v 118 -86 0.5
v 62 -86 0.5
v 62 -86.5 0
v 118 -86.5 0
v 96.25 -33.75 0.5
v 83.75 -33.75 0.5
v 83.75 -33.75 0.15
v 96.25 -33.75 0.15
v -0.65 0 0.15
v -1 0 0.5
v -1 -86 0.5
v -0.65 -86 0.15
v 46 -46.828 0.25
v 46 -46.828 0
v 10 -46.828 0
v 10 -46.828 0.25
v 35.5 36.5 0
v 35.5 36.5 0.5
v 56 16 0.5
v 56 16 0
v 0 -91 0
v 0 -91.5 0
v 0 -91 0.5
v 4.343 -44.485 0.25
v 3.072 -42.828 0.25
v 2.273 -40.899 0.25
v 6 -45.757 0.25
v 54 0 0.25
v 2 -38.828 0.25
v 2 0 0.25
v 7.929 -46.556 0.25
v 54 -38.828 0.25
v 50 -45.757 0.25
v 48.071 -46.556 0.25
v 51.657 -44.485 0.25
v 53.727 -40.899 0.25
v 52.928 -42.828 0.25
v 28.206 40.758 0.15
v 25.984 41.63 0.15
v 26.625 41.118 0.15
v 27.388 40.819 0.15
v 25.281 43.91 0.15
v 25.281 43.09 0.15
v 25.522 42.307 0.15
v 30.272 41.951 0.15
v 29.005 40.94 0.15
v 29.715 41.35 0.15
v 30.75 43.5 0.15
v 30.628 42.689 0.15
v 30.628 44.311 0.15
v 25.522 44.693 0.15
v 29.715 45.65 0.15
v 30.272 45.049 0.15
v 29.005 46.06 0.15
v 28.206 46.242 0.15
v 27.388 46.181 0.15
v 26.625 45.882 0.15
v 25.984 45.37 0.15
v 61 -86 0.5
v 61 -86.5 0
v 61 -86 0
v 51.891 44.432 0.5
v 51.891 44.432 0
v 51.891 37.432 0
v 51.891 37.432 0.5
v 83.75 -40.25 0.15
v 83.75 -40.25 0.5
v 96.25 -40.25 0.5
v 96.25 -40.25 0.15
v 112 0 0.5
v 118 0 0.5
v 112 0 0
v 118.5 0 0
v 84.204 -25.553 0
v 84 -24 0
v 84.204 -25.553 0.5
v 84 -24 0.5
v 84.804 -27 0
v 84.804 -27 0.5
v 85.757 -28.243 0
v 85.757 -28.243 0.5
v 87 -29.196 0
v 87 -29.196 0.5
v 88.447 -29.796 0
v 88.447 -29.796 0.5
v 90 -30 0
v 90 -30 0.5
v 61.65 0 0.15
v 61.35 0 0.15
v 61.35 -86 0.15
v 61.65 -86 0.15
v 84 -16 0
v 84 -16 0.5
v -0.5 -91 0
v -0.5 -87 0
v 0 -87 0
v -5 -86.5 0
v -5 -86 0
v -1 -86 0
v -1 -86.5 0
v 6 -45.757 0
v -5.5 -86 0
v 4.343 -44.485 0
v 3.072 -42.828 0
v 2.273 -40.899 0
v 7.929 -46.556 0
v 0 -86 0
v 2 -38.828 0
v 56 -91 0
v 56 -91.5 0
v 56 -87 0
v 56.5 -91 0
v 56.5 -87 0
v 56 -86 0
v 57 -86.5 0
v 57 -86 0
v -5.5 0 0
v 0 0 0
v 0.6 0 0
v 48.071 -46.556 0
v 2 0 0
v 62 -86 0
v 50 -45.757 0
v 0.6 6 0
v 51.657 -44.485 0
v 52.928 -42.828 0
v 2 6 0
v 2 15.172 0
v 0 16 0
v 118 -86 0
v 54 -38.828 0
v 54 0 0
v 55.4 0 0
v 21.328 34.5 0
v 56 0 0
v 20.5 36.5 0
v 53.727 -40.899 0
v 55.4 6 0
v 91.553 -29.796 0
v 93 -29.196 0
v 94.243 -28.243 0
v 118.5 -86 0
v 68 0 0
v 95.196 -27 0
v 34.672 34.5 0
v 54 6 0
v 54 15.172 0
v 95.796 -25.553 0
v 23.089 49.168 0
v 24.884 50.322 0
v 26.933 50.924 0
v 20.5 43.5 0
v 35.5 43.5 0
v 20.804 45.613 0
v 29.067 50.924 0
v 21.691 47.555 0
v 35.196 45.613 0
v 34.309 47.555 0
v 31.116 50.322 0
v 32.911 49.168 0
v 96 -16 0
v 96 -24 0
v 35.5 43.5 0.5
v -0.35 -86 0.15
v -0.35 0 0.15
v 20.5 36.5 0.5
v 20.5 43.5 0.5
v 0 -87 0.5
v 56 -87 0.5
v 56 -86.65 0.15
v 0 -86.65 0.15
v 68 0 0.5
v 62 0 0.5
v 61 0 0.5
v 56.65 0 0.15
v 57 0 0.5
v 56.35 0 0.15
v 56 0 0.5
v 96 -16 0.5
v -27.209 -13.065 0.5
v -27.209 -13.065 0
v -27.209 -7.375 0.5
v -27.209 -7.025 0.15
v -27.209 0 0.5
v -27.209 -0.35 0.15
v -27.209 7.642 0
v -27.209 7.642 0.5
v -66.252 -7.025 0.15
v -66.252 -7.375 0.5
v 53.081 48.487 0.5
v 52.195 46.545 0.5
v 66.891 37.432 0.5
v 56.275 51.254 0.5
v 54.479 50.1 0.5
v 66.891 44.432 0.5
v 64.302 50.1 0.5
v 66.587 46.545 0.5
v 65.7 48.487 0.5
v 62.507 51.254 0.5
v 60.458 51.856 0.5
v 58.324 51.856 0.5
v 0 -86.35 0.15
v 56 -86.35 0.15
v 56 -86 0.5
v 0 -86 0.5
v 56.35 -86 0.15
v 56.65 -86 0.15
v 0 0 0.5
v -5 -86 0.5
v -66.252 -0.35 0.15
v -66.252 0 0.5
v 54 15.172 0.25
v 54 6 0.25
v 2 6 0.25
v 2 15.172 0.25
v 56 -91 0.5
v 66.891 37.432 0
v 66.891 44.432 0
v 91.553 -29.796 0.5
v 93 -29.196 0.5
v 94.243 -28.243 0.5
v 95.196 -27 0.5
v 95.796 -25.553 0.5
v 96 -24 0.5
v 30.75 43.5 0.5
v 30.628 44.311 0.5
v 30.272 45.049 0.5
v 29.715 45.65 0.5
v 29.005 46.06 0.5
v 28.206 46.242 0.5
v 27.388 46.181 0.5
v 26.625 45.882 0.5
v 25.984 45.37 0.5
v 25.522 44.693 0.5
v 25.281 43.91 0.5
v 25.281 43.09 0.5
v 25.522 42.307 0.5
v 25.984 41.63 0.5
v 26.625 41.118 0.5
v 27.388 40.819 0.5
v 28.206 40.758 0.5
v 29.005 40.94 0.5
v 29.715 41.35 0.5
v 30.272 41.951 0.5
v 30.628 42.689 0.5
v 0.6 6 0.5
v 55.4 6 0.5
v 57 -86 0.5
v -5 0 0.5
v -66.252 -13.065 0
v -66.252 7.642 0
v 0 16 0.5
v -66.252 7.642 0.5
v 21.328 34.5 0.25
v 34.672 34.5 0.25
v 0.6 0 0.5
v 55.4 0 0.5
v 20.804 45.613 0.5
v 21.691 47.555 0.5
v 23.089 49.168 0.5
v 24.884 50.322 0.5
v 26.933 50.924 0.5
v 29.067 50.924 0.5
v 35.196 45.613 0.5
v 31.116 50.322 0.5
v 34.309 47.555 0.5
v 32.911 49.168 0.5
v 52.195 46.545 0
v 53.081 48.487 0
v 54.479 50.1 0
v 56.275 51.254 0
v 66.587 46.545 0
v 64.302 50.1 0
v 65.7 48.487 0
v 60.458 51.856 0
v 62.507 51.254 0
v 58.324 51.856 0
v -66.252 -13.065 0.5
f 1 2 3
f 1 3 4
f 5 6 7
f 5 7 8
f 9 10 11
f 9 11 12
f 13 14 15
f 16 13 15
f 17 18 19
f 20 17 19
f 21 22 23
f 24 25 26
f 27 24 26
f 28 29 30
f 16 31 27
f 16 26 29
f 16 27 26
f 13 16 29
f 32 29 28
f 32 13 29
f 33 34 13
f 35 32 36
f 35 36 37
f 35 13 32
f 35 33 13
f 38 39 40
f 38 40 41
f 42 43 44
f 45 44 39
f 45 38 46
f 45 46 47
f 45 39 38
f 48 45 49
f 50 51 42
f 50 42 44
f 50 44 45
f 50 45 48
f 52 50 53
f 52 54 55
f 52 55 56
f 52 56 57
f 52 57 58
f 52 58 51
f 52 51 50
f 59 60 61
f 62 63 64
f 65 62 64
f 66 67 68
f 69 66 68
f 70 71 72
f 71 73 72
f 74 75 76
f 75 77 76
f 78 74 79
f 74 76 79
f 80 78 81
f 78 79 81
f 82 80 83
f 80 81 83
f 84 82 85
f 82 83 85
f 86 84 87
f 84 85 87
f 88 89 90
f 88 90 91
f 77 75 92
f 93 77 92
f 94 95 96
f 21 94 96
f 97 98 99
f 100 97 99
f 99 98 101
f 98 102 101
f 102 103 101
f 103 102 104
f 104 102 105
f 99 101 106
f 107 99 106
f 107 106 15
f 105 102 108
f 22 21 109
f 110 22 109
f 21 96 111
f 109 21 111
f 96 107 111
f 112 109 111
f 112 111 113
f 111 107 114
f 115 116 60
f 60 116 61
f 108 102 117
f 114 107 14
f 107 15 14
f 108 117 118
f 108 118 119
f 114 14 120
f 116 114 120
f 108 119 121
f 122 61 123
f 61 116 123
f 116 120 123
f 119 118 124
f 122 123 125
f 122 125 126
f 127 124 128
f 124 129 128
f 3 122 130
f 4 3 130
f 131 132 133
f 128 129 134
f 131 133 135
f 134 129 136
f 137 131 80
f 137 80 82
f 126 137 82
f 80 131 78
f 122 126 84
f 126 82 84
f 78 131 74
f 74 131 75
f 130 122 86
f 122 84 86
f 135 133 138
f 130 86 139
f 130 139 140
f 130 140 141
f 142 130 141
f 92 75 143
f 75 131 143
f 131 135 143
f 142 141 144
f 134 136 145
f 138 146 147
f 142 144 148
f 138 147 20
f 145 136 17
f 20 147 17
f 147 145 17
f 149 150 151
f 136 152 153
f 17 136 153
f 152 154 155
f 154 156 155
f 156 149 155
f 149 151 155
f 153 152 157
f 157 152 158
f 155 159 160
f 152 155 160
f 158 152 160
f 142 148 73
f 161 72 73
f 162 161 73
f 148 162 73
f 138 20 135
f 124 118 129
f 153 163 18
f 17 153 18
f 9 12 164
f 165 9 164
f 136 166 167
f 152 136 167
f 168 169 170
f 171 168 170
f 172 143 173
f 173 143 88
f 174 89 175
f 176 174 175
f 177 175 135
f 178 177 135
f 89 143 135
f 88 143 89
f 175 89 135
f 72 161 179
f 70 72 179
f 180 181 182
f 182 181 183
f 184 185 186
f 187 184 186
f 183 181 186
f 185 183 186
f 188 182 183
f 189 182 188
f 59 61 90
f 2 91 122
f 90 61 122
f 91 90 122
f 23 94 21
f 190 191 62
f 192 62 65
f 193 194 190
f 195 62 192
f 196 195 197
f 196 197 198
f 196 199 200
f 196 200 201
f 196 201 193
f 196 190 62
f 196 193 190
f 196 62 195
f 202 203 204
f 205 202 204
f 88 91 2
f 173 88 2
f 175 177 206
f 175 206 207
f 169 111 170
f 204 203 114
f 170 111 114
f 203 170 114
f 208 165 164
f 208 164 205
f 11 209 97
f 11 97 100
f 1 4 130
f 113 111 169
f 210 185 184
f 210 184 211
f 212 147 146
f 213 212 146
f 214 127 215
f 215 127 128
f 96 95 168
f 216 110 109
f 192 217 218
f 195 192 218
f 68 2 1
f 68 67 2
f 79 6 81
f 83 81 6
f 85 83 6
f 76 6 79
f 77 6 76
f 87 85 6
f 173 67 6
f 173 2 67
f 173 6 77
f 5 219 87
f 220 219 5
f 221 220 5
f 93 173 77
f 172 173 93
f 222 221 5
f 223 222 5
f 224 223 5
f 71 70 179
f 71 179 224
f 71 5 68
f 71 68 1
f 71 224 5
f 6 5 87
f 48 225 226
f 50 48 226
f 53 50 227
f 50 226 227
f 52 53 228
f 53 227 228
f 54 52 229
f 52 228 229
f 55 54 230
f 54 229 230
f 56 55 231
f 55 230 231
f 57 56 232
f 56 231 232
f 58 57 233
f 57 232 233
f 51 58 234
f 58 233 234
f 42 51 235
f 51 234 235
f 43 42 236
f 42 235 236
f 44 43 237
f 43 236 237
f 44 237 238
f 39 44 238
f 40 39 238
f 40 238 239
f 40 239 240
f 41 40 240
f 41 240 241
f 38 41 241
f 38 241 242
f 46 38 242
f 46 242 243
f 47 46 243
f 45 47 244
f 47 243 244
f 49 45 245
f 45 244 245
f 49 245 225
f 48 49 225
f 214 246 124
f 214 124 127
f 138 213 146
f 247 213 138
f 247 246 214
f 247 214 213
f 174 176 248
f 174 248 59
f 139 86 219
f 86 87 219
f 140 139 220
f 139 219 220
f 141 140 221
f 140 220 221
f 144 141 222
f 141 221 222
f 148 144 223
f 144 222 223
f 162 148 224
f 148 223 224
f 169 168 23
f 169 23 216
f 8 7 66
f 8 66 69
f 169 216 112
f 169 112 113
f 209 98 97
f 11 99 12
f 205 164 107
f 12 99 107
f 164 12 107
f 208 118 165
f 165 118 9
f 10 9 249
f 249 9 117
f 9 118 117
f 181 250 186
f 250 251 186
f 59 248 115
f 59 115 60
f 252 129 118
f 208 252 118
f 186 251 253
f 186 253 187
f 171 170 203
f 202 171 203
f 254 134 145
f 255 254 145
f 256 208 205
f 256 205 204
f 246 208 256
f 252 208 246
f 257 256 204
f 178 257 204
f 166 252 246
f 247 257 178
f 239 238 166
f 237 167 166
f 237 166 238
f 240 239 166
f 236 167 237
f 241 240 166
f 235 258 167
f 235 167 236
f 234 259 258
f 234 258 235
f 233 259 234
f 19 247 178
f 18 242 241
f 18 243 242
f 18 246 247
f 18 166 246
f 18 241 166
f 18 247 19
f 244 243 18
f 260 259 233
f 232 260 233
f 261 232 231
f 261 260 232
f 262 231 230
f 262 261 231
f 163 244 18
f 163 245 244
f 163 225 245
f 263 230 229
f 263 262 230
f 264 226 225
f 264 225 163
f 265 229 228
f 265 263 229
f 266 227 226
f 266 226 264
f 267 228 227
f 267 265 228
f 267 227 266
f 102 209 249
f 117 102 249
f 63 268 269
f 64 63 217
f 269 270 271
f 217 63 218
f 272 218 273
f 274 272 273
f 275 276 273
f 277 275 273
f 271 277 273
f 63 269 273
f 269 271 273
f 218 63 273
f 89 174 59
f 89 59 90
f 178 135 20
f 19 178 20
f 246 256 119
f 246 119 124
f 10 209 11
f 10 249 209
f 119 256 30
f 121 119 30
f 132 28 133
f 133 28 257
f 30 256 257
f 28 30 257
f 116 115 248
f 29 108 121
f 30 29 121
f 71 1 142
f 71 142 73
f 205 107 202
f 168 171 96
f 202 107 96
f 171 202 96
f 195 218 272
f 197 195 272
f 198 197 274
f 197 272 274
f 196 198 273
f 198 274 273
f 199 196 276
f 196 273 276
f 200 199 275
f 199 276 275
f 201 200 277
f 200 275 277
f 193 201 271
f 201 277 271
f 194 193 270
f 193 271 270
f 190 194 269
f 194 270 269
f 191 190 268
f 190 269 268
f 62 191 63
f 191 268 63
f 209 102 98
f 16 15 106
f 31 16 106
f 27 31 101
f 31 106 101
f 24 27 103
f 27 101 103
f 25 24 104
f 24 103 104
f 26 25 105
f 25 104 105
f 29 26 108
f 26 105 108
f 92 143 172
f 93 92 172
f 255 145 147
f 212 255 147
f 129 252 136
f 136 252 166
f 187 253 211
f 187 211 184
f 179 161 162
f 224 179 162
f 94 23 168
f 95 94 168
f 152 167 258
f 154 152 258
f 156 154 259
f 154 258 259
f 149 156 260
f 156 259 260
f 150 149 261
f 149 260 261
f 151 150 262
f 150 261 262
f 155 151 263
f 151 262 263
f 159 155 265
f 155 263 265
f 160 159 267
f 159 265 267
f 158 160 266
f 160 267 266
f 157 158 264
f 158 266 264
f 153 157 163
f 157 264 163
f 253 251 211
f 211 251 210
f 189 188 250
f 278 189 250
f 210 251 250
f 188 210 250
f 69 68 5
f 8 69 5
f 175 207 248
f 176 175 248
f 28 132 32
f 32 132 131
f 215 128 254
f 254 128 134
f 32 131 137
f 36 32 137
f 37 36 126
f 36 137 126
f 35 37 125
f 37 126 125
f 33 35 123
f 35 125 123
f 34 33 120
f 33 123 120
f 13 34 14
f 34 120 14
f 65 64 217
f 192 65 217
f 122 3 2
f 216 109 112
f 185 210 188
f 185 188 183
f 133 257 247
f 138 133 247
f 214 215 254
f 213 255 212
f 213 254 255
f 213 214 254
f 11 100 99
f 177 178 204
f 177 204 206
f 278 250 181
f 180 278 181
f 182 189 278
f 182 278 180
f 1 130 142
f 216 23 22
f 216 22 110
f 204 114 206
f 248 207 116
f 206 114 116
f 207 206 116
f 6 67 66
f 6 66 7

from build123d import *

# Parameters (mm, degrees)
F0_W      = 56
F0_H      = 8
F0_H_2    = 86
F0_W_2    = 0.5
F0_H_3    = 0.5
F0_H_4    = 43
F0_W_3    = 4
F0_H_5    = 4
F1_DEPTH  = 0.5
F2_SIZE2  = 0.49999
F2_SIZE   = 0.49999
F4_DEPTH  = 86
F6_DEPTH  = 25
F7_R      = 2.75
F8_DEPTH  = 0.35
F9_W      = 12.5
F9_H      = 6.5
F10_DEPTH = 0.35
F11_W     = 39.043193683
F11_H     = 5.6905061938
F11_H_2   = 7.6418016106
F11_H_3   = 7.3748123832
F12_DEPTH = 0.15
F13_DEPTH = 0.5
F14_SIZE  = 0.34999
F15_W     = 54.8
F15_H     = 6
F16_DEPTH = 25
F17_R     = 5.99999
F18_SIZE  = 16
F20_DEPTH = 56
F22_DEPTH = 0.5
F25_DEPTH = 0.25


# Not quite as in the source:
# - a fillet or chamfer is up to 0.001 mm smaller than in the source, because OpenCascade refuses the exact size


with BuildPart() as f1:
    # F0 (on Top) → F1 (new body)
    with BuildSketch(Plane.XY):
        with Locations((28, 4)):
            Rectangle(F0_W, F0_H)
        with Locations((28, -43)):
            Rectangle(F0_W, F0_H_2)
        with Locations((-0.25, -43)):
            Rectangle(F0_W_2, F0_H_2)
        with Locations((56.25, -43)):
            Rectangle(F0_W_2, F0_H_2)
        with Locations((28, -86.25)):
            Rectangle(F0_W, F0_H_3)
        with Locations((-0.75, -43)):
            Rectangle(F0_W_2, F0_H_2)
        with Locations((28, 29.5)):
            Rectangle(F0_W, F0_H_4)
        with Locations((56.75, -43)):
            Rectangle(F0_W_2, F0_H_2)
        with Locations((28, -86.75)):
            Rectangle(F0_W, F0_H_3)
        with Locations((-3, -43)):
            Rectangle(F0_W_3, F0_H_2)
        with Locations((59, -43)):
            Rectangle(F0_W_3, F0_H_2)
        with Locations((-3, -86.25)):
            Rectangle(F0_W_3, F0_H_3)
        with Locations((28, -89)):
            Rectangle(F0_W, F0_H_5)
        with Locations((-0.25, -89)):
            Rectangle(F0_W_2, F0_H_5)
        with Locations((-5.25, -43)):
            Rectangle(F0_W_2, F0_H_2)
        with Locations((59, -86.25)):
            Rectangle(F0_W_3, F0_H_3)
        with Locations((56.25, -89)):
            Rectangle(F0_W_2, F0_H_5)
        with Locations((61.25, -43)):
            Rectangle(F0_W_2, F0_H_2)
        with Locations((28, -91.25)):
            Rectangle(F0_W, F0_H_3)
        with Locations((61.75, -43)):
            Rectangle(F0_W_2, F0_H_2)
        Polygon((84, 0), (62, 0), (62, -86), (118, -86), (118, 0), (96, 0), (96, -30), (84, -30), align=None)
        with Locations((90, -86.25)):
            Rectangle(F0_W, F0_H_3)
        with Locations((118.25, -43)):
            Rectangle(F0_W_2, F0_H_2)
    extrude(amount=F1_DEPTH)

    # F2 (size 0.5 and 0.5 in the source; OpenCascade refuses exactly that, so slightly less here)
    f2_edges = [f1.edges().sort_by_distance(p)[0] for p in [
        (-5.5, -43, 0.5),
        (-3, -86.5, 0.5),
        (-0.5, -89, 0.5),
        (28, -91.5, 0.5),
        (56.5, -89, 0.5),
        (59, -86.5, 0.5),
        (90, -86.5, 0.5),
        (118.5, -43, 0.5),
    ]]
    chamfer(f2_edges, length=F2_SIZE, length2=F2_SIZE2)

    # F3 (on face) → F4 (cut, through all)
    with BuildSketch(Plane.XZ.offset(86)):
        Polygon((0, 0.5), (-1, 0.5), (-0.65, 0.15), (-0.35, 0.15), align=None)
        Polygon((57, 0.5), (56, 0.5), (56.35, 0.15), (56.65, 0.15), align=None)
        Polygon((62, 0.5), (61, 0.5), (61.35, 0.15), (61.65, 0.15), align=None)
    extrude(amount=-F4_DEPTH, mode=Mode.SUBTRACT)

    # F5 (on face) → F6 (cut)
    with BuildSketch(Plane.XY.offset(0.5)):
        with BuildLine():
            Line((34, 51), (28, 51))
            ThreePointArc((28, 51), (33.3033008589, 48.8033008589), (35.5, 43.5))
            Line((35.5, 43.5), (35.5, 36.5))
            Line((35.5, 36.5), (56, 16))
            Line((56, 16), (56, 51))
            Line((56, 51), (34, 51))
        make_face()
        with BuildLine():
            Line((28, 51), (22, 51))
            Line((22, 51), (0, 51))
            Line((0, 51), (0, 16))
            Line((0, 16), (20.5, 36.5))
            Line((20.5, 36.5), (20.5, 43.5))
            ThreePointArc((20.5, 43.5), (22.6966991411, 48.8033008589), (28, 51))
        make_face()
    extrude(amount=-F6_DEPTH, mode=Mode.SUBTRACT)

    # F7 (on face) → F8 (cut)
    with BuildSketch(Plane.XY.offset(0.5)):
        with Locations((28, 43.5)):
            Circle(F7_R)
    extrude(amount=-F8_DEPTH, mode=Mode.SUBTRACT)

    # F9 (on face) → F10 (cut)
    with BuildSketch(Plane.XY.offset(0.5)):
        with Locations((90, -37)):
            Rectangle(F9_W, F9_H)
    extrude(amount=-F10_DEPTH, mode=Mode.SUBTRACT)

    # F15 (on face) → F16 (cut)
    with BuildSketch(Plane.XY.offset(0.5)):
        with Locations((28, 3)):
            Rectangle(F15_W, F15_H)
    extrude(amount=-F16_DEPTH, mode=Mode.SUBTRACT)

    # F17 (radius 6 in the source; OpenCascade refuses exactly that, so slightly less here)
    f17_edges = [f1.edges().sort_by_distance(p)[0] for p in [
        (84, -30, 0.25),
        (96, -30, 0.25),
    ]]
    fillet(f17_edges, radius=F17_R)

    # F18
    f18_edges = [f1.edges().sort_by_distance(p)[0] for p in [
        (84, 0, 0.25),
        (96, 0, 0.25),
    ]]
    chamfer(f18_edges, length=F18_SIZE)

    # F19 (on face) → F20 (cut, through all)
    with BuildSketch(Plane.YZ.offset(56)):
        Polygon((-86, 0.5), (-87, 0.5), (-86.65, 0.15), (-86.35, 0.15), align=None)
    extrude(amount=-F20_DEPTH, mode=Mode.SUBTRACT)

    # F24 (on face) → F25 (cut)
    with BuildSketch(Plane(origin=(0, 0, 0), x_dir=(1, 0, 0), z_dir=(0, 0, -1))):
        with BuildLine():
            Line((54, -15.1715728753), (54, 38.8284271247))
            ThreePointArc((54, 38.8284271247), (51.6568542495, 44.4852813742), (46, 46.8284271247))
            Line((46, 46.8284271247), (10, 46.8284271247))
            ThreePointArc((10, 46.8284271247), (4.3431457505, 44.4852813742), (2, 38.8284271247))
            Line((2, 38.8284271247), (2, -15.1715728753))
            Line((2, -15.1715728753), (21.3284271247, -34.5))
            Line((21.3284271247, -34.5), (34.6715728753, -34.5))
            Line((34.6715728753, -34.5), (54, -15.1715728753))
        make_face()
    extrude(amount=-F25_DEPTH, mode=Mode.SUBTRACT)


with BuildPart() as f12:
    # F11 (on Top) → F12 (new body)
    with BuildSketch(Plane.XY):
        with Locations((-46.7307167128, -10.2200654801)):
            Rectangle(F11_W, F11_H)
        with Locations((-46.7307167128, 3.8209008053)):
            Rectangle(F11_W, F11_H_2)
        with Locations((-46.7307167128, -3.6874061916)):
            Rectangle(F11_W, F11_H_3)
    extrude(amount=F12_DEPTH)

    # F11 (on Top) → F13 (join)
    with BuildSketch(Plane.XY):
        with Locations((-46.7307167128, -10.2200654801)):
            Rectangle(F11_W, F11_H)
        with Locations((-46.7307167128, 3.8209008053)):
            Rectangle(F11_W, F11_H_2)
    extrude(amount=F13_DEPTH)

    # F14 (size 0.35 in the source; OpenCascade refuses exactly that, so slightly less here)
    f14_edges = [f12.edges().sort_by_distance(p)[0] for p in [
        (-46.730717, -7.374812, 0.15),
        (-46.730717, 0, 0.15),
    ]]
    chamfer(f14_edges, length=F14_SIZE)


with BuildPart() as f22:
    # F21 (on Top) → F22 (new body)
    with BuildSketch(Plane.XY):
        with BuildLine():
            Line((51.8908984959, 44.4321229756), (51.8908984959, 37.4321229756))
            Line((51.8908984959, 37.4321229756), (66.8908984959, 37.4321229756))
            Line((66.8908984959, 37.4321229756), (66.8908984959, 44.4321229756))
            ThreePointArc((66.8908984959, 44.4321229756), (59.3908984959, 51.9321229756), (51.8908984959, 44.4321229756))
        make_face()
    extrude(amount=F22_DEPTH)


solid = Compound([f1.part, f12.part, f22.part])
